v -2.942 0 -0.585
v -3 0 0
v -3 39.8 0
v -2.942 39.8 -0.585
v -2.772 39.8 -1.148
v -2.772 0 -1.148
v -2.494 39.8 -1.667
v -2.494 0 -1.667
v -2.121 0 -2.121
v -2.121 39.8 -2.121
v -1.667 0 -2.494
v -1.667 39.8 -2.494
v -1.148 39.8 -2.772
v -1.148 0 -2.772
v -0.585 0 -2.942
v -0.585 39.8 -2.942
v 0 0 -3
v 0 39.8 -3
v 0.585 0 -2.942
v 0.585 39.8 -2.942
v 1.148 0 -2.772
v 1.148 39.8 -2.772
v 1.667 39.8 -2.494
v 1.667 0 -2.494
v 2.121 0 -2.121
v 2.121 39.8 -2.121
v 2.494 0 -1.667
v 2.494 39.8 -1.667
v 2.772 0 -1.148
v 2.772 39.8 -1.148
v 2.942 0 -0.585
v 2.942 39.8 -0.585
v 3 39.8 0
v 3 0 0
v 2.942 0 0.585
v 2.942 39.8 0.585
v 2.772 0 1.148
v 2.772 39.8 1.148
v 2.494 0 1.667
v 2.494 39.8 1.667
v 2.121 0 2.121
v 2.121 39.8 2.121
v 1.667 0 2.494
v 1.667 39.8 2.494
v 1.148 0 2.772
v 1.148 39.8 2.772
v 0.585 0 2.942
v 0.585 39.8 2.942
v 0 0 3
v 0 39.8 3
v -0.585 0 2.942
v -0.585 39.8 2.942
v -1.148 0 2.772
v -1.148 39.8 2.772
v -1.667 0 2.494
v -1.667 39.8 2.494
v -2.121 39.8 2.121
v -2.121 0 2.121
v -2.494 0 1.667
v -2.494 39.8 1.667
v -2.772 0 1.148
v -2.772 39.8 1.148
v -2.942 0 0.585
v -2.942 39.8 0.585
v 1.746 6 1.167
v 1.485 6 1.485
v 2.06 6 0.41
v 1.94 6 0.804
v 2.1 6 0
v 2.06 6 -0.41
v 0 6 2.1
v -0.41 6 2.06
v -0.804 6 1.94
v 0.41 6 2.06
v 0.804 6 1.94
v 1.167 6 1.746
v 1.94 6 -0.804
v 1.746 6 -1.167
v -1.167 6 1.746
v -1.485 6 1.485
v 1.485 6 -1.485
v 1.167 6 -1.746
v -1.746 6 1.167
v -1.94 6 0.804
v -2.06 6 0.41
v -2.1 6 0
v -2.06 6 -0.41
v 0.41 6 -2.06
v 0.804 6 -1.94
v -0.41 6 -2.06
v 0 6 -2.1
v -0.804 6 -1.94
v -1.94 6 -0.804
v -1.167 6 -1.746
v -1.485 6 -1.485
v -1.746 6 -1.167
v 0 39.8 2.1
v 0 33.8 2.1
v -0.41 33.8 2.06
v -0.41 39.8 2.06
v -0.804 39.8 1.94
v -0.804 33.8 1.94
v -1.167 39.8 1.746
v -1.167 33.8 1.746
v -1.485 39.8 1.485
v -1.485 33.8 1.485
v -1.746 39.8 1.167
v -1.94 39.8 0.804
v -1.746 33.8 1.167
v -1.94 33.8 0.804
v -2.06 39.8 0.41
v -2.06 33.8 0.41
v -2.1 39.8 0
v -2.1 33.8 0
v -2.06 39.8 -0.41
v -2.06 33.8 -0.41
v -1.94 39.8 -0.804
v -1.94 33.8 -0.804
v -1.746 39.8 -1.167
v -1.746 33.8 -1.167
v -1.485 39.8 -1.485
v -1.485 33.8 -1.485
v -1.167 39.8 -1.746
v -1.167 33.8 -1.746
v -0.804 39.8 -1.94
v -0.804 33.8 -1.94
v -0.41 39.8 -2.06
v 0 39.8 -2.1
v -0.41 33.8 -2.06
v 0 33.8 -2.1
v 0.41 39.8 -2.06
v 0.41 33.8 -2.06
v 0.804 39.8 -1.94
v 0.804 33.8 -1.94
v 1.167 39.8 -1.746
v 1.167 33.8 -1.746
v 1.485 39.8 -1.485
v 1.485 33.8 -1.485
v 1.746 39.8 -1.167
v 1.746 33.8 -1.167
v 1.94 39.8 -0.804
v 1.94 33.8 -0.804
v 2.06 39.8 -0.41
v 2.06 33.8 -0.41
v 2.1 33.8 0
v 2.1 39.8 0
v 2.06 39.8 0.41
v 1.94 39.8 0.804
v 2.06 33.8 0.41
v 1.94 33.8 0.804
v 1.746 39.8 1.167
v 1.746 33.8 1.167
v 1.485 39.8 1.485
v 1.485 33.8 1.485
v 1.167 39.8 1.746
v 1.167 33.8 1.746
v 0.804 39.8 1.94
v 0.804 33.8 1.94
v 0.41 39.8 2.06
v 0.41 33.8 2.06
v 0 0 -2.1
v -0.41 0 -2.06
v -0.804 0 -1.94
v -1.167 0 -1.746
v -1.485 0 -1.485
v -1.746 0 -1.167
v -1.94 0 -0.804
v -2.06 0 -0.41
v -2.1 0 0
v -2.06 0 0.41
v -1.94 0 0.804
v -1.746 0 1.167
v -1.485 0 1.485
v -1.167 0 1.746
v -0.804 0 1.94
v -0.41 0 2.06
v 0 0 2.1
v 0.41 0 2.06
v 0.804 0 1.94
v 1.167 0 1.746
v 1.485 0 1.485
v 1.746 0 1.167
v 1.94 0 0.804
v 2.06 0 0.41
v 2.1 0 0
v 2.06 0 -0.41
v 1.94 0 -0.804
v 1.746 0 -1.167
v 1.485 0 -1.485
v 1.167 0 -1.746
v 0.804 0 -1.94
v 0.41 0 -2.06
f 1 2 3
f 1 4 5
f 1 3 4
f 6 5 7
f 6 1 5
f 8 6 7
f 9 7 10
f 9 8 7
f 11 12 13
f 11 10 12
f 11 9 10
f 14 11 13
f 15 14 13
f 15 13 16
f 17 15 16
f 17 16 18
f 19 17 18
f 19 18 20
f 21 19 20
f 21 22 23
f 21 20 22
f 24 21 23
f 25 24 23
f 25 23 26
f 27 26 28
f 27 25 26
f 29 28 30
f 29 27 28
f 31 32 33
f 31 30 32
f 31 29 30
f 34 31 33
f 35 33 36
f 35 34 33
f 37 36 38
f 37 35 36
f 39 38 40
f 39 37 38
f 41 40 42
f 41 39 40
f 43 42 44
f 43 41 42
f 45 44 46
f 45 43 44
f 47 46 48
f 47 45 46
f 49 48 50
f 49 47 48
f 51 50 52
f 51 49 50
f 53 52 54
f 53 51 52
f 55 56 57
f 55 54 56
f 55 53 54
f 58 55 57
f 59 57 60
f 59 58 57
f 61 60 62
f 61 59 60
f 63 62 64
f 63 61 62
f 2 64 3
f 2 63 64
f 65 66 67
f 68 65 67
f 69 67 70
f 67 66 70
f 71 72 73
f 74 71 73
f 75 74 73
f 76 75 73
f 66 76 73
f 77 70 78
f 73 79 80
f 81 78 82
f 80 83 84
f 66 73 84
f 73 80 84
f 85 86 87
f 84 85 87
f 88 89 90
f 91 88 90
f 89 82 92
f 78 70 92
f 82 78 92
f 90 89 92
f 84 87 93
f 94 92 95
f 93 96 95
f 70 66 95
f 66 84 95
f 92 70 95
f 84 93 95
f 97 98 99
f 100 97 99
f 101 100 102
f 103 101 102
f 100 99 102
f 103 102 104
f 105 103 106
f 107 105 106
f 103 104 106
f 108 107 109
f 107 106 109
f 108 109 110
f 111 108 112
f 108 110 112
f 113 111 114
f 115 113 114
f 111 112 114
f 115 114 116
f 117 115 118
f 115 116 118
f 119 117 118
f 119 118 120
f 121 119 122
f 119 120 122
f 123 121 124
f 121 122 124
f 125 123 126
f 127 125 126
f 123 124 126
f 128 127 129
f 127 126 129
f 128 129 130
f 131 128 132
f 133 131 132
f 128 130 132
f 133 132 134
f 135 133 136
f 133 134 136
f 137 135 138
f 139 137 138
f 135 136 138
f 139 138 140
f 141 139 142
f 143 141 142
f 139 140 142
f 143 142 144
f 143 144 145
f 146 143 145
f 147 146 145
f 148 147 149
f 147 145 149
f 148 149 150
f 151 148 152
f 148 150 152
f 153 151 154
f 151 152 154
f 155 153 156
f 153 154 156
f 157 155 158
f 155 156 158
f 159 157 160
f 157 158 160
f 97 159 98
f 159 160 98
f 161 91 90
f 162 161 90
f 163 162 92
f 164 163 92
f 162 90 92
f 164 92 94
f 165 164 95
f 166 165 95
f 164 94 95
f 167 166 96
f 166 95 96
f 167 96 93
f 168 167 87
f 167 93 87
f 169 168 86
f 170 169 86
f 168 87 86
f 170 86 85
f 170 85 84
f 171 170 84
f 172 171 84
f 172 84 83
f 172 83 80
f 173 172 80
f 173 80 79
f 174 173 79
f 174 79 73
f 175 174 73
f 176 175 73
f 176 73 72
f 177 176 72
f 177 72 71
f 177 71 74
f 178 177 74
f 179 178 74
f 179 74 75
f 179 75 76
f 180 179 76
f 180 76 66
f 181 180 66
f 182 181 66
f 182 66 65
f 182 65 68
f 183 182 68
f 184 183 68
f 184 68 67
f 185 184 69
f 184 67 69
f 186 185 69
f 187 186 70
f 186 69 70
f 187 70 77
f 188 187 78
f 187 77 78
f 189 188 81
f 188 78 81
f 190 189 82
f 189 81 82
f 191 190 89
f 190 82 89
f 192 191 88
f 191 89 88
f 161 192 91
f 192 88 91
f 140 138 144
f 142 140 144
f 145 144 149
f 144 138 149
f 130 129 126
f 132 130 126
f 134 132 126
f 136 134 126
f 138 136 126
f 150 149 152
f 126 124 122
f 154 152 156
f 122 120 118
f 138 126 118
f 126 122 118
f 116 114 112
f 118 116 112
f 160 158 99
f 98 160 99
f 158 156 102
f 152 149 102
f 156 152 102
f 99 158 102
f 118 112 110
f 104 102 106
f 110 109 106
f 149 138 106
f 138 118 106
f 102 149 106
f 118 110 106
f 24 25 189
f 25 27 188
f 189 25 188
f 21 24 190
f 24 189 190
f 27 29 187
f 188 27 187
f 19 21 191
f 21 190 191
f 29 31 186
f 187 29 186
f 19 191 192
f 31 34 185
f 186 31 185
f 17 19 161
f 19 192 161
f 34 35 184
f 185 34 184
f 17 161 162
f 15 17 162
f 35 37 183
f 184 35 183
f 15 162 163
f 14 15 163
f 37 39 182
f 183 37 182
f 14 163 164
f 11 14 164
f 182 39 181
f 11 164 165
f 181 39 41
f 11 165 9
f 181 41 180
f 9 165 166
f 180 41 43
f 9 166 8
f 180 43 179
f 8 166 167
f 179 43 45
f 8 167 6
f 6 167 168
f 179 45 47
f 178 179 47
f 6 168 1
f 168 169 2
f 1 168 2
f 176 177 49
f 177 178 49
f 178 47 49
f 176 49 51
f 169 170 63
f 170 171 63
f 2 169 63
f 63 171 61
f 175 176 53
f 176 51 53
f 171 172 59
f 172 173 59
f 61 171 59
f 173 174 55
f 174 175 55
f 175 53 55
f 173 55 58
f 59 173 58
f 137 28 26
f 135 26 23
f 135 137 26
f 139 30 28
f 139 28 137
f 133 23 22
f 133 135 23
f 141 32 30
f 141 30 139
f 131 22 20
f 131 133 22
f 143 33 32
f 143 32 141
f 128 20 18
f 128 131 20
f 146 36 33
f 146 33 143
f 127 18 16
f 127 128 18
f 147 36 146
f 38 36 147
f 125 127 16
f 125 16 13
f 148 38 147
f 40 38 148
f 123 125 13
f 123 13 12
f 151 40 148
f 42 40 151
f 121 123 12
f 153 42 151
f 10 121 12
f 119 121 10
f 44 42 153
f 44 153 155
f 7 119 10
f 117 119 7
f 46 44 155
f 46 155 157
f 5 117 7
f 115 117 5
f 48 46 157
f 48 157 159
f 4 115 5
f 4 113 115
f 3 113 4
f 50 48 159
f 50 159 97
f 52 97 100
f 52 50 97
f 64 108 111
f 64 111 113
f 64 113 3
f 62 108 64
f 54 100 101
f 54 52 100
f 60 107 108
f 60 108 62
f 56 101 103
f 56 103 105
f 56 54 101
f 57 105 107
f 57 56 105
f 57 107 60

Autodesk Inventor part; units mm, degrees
ref_plane "YZ Plane" through (0, 0, 0) normal (1, 0, 0) x (0, 1, 0)
ref_plane "XZ Plane" through (0, 0, 0) normal (0, 1, 0) x (-1, 0, 0)
ref_plane "XY Plane" through (0, 0, 0) normal (0, 0, 1) x (1, 0, 0)
sketch "Sketch1" plane through (0, 0, 0) normal (0, 1, 0) x (-1, 0, 0)
  circle A0 centre (0, 0) radius 3
  dimension "d0" = 6
extrude "Extrusion1" add sketch "Sketch1" along normal blind 39.8
hole "Hole1" at (0, 0, 0) direction (0, 1, 0) diameter 4.2 depth 6
sketch "Sketch2" plane through (0, 39.8, 0) normal (0, 1, 0) x (1, 0, 0)
  point P0 (0, 0)
hole "Hole2" at (0, 39.8, 0) direction (0, -1, 0) diameter 4.2 depth 6
properties part number "Dribbler Support"
